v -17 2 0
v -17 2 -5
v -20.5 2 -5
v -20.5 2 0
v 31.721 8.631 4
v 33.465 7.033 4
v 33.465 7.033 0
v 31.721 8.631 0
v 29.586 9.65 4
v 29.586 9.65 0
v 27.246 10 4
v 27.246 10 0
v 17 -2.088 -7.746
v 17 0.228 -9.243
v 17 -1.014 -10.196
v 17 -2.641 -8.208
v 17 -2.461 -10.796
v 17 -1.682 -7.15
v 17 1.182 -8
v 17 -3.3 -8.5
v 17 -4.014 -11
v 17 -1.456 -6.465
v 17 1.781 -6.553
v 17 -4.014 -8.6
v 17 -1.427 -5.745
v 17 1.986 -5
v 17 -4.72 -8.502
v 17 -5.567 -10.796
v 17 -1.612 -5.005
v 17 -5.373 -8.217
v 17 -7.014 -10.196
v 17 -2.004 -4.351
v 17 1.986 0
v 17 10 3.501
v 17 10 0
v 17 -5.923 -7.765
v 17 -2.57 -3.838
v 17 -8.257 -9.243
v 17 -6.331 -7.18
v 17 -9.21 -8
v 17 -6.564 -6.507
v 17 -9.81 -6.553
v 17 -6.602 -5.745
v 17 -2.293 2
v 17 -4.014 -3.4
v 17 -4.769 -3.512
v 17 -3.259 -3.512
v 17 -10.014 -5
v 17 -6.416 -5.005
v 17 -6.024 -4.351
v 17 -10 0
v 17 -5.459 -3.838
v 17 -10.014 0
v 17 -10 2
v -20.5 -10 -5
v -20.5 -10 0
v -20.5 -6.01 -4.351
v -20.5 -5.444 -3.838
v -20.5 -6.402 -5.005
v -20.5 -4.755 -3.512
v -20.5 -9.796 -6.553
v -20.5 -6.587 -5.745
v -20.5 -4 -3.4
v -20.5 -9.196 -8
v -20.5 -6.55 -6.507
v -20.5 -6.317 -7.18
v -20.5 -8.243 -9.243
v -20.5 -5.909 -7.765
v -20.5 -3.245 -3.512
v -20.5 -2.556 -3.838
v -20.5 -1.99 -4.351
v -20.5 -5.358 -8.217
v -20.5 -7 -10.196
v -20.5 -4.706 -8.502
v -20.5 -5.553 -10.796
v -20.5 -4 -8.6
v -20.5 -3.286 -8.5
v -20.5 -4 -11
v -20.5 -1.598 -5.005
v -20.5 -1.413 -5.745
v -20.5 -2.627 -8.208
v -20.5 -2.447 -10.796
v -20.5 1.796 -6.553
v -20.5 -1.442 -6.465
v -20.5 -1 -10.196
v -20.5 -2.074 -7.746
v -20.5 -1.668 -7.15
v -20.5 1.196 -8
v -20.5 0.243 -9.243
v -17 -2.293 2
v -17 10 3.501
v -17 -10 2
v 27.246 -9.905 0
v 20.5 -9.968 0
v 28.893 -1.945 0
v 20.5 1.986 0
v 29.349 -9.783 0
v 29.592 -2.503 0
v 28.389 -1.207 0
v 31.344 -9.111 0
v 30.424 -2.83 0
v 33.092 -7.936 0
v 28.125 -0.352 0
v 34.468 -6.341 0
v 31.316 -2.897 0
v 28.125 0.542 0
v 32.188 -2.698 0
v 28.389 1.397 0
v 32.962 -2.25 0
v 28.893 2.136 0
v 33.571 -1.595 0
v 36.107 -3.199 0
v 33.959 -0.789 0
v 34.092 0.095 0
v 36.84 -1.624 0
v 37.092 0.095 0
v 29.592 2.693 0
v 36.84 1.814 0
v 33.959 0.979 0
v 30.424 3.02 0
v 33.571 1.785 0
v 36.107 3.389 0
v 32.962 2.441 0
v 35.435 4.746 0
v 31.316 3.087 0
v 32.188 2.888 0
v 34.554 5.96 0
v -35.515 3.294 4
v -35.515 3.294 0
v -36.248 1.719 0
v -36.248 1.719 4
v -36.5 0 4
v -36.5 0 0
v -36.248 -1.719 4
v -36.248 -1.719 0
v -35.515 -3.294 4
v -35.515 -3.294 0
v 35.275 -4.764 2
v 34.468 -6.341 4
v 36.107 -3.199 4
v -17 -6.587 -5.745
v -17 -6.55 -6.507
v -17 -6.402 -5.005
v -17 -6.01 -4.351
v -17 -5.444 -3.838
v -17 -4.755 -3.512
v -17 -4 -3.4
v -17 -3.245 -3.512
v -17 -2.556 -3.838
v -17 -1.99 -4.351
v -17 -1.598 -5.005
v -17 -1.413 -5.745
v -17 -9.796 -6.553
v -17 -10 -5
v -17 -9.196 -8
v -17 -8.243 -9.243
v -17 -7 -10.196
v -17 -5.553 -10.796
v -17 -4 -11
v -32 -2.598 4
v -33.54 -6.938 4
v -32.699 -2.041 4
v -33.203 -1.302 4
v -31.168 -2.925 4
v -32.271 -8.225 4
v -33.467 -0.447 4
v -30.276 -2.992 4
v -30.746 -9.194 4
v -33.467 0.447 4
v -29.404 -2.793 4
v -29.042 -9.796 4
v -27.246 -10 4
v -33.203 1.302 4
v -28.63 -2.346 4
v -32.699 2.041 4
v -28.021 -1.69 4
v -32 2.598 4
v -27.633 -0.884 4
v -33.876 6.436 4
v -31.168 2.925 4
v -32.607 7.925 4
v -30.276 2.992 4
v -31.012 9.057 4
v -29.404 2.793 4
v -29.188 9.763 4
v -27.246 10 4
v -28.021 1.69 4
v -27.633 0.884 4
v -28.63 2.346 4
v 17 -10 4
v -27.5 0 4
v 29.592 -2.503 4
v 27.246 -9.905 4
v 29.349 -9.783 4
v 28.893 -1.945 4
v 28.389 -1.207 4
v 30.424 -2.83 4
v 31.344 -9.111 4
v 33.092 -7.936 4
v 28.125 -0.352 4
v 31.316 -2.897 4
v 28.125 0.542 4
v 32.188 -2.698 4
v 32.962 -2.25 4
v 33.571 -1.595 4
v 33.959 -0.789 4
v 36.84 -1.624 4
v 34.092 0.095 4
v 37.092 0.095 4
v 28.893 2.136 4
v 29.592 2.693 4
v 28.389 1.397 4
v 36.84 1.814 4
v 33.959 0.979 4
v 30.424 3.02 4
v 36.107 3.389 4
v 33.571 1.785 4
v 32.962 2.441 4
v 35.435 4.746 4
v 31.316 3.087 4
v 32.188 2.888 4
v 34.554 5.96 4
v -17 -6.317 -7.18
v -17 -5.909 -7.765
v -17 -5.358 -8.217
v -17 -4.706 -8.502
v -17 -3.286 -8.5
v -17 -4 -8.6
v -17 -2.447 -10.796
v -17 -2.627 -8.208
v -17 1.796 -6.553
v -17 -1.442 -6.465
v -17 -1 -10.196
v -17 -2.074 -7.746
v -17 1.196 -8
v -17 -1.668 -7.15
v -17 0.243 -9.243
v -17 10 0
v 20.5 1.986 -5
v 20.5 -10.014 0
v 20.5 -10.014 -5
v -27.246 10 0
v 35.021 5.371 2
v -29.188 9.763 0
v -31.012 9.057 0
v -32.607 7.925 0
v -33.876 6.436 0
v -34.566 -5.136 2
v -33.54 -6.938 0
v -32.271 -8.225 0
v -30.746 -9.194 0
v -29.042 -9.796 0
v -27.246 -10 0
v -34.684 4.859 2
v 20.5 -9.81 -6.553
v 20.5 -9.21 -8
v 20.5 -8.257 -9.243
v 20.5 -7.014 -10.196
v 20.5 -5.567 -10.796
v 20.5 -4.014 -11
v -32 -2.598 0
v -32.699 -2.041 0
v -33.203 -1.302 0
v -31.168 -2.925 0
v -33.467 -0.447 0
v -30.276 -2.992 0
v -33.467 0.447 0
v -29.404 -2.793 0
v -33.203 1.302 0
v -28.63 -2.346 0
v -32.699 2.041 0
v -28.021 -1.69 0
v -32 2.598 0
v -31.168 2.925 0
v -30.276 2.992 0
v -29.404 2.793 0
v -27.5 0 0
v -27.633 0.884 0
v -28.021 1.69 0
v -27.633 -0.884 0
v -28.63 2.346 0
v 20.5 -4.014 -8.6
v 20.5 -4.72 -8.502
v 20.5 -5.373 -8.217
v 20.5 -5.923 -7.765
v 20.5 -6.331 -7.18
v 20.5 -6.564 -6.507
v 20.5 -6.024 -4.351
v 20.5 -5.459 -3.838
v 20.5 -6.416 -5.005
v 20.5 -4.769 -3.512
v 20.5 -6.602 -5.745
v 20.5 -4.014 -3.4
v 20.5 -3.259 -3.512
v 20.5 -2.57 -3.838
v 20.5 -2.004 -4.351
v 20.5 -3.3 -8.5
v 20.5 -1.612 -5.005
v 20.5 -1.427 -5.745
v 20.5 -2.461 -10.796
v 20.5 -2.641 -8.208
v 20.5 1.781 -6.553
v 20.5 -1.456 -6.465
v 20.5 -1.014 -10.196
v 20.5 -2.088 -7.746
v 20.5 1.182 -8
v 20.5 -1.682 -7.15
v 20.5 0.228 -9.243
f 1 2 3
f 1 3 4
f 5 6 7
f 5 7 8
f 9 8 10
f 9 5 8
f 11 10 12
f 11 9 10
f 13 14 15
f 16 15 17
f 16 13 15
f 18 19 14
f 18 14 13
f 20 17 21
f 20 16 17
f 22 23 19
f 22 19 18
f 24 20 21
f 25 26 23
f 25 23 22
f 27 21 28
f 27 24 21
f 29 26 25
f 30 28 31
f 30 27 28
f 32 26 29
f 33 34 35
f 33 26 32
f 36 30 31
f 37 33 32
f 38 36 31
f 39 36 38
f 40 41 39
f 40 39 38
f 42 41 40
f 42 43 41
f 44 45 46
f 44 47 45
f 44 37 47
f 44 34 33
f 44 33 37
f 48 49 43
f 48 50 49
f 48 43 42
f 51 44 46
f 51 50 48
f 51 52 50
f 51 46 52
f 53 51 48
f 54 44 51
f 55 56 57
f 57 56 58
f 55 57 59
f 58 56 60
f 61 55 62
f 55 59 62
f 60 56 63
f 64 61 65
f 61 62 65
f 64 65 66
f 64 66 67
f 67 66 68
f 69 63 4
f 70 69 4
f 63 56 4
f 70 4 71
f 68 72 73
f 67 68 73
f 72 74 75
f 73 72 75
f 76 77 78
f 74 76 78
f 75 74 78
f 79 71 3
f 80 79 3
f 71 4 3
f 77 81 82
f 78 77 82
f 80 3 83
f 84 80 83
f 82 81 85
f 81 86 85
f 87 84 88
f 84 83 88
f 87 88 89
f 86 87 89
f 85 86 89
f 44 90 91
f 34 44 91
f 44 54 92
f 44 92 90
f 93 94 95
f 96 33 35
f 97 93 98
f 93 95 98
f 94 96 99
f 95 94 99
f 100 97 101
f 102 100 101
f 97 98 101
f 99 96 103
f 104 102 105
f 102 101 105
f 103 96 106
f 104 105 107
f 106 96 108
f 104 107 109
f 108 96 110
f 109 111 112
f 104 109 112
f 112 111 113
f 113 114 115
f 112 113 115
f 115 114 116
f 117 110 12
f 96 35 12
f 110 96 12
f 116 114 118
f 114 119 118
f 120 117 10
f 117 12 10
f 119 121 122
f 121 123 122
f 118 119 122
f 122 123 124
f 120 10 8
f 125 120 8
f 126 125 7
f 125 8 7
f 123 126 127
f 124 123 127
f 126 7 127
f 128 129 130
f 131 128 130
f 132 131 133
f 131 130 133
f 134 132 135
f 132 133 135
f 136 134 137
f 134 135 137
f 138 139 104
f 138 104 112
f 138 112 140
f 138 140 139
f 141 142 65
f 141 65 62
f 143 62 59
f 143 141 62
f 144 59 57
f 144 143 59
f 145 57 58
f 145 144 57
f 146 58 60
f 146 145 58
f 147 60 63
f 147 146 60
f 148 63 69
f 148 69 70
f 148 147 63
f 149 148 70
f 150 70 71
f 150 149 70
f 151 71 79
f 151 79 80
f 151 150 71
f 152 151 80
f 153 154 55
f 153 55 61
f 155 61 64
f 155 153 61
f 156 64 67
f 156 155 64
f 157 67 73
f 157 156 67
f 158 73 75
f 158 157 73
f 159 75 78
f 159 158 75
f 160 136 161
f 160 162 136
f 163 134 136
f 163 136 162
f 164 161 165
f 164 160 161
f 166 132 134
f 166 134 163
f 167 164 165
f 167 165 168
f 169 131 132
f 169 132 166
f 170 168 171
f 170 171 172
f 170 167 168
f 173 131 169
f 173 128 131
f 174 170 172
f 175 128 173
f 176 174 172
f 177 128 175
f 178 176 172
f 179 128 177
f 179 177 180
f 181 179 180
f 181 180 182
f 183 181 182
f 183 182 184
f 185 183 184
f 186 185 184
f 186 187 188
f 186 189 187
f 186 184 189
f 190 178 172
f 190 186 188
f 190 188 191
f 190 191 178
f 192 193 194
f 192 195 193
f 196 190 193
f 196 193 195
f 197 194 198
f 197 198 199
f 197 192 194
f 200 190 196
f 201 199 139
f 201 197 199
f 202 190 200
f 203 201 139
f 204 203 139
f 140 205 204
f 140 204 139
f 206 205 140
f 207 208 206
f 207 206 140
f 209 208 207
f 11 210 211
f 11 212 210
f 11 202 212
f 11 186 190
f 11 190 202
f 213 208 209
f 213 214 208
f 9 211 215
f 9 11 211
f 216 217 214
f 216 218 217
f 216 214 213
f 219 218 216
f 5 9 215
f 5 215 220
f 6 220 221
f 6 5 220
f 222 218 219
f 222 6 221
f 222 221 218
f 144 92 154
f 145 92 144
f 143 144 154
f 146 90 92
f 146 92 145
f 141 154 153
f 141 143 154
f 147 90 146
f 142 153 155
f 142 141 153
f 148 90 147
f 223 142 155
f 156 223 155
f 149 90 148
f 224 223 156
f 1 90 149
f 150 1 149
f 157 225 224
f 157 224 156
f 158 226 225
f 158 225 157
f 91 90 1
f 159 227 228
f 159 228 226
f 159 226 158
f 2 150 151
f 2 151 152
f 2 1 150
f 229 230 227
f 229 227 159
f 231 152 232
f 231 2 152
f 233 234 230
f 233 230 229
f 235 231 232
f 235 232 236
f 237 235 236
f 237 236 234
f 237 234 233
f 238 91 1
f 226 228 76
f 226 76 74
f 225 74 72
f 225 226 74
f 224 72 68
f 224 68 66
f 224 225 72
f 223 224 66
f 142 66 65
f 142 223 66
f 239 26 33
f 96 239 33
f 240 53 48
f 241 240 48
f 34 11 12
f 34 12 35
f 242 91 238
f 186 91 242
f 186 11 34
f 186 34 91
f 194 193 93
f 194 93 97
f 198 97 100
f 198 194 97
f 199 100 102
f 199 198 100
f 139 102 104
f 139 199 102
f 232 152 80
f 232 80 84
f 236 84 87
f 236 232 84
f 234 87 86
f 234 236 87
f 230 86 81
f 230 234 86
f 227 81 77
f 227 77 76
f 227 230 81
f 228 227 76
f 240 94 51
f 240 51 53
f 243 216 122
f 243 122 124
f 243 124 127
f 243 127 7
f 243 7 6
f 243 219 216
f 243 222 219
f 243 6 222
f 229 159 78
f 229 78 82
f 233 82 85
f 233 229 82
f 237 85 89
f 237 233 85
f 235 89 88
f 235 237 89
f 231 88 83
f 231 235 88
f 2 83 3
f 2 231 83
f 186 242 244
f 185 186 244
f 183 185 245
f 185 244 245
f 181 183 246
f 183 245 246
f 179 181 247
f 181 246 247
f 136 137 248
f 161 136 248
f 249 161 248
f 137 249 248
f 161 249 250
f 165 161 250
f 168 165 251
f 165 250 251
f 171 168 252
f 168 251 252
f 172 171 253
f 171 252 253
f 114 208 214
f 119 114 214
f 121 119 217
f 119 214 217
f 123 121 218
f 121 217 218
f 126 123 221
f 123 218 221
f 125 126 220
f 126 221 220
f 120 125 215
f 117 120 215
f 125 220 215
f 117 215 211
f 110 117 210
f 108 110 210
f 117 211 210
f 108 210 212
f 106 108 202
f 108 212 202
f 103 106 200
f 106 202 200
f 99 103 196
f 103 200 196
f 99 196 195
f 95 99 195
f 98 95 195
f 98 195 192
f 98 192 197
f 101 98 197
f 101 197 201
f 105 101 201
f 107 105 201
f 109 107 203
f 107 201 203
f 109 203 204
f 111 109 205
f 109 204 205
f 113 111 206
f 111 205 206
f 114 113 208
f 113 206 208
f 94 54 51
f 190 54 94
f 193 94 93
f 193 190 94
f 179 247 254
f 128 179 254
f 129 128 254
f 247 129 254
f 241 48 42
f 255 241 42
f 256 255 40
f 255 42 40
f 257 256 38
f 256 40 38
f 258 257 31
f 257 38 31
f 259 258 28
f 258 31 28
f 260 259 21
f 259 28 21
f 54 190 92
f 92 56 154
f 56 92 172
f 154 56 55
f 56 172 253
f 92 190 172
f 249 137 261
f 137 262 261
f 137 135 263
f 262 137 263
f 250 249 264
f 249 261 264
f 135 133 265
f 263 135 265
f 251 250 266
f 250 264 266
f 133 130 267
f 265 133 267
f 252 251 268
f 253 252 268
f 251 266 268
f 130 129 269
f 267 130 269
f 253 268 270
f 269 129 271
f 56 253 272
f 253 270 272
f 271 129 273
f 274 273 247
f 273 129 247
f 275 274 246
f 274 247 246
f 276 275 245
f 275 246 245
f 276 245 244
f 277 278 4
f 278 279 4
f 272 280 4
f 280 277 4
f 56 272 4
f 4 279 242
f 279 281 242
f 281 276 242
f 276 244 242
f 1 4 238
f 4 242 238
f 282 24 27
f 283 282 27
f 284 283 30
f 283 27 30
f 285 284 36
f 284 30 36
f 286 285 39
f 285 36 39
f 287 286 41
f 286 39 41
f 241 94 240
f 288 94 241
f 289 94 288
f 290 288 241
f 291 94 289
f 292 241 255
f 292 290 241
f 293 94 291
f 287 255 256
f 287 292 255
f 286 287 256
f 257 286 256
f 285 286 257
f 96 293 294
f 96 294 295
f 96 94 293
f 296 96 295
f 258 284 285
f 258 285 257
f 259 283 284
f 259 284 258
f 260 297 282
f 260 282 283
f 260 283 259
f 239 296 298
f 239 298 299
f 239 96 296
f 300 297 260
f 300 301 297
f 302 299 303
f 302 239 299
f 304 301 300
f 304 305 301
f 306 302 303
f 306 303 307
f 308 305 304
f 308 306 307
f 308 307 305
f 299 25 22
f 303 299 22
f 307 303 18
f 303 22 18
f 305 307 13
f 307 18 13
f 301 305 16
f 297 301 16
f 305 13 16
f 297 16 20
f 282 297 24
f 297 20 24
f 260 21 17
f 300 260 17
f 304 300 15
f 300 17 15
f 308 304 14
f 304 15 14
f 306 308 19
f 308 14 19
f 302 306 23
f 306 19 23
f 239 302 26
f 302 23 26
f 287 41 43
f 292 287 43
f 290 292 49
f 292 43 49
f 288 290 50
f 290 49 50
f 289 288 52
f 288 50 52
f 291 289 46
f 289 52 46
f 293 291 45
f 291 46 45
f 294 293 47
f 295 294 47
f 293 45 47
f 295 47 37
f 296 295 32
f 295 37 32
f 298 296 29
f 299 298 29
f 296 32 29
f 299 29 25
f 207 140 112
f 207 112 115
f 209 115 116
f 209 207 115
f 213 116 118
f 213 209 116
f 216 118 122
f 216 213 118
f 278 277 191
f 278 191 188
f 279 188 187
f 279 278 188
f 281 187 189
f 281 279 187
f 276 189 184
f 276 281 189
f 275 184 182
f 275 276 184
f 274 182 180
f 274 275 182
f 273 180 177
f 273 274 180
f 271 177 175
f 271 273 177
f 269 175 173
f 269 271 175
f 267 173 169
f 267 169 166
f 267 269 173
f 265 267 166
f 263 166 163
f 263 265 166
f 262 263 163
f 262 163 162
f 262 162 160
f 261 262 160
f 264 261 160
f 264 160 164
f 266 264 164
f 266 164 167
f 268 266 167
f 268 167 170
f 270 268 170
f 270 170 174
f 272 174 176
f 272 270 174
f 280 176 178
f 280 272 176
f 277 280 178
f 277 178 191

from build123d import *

# Parameters (mm, degrees)
SKETCH1_R           = 3.000027903
BOSS_EXTRUDE1_DEPTH = 4
BOSS_EXTRUDE4_DEPTH = 3.5
BOSS_EXTRUDE6_DEPTH = 34
BOSS_EXTRUDE7_DEPTH = 3.5
SKETCH8_R           = 3.000027903
BOSS_EXTRUDE8_DEPTH = 4


with BuildPart() as part:
    # Sketch1 → Boss-Extrude1 (new body)
    with BuildSketch(Plane.XY):
        with BuildLine():
            ThreePointArc((-35.515, 3.29389), (-36.500003461, -2e-06), (-35.515, -3.293894))
            add(Edge.make_bspline(
                [(-35.515, -3.293894), (-34.604438991, -5.156956918), (-33.54048, -6.937562)],
                knots=[0, 0, 0, 1, 1, 1], degree=2))
            ThreePointArc((-33.54048, -6.937562), (-30.745960827, -9.193764608), (-27.245993386, -10.000000017))
            Line((-27.245993386, -10.000000017), (-16.999993386, -10.000000017))
            Line((-16.999993386, -10.000000017), (-16.999993386, 9.999999983))
            Line((-16.999993386, 9.999999983), (-27.245993386, 9.999999983))
            ThreePointArc((-27.245993386, 9.999999983), (-31.011968955, 9.057189861), (-33.875915, 6.4362595))
            add(Edge.make_bspline(
                [(-33.875915, 6.4362595), (-34.671605619, 4.852572547), (-35.515, 3.29389)],
                knots=[0, 0, 0, 1, 1, 1], degree=2))
        make_face()
        with Locations((-30.500046711, -2e-06)):
            Circle(SKETCH1_R, mode=Mode.SUBTRACT)
    extrude(amount=BOSS_EXTRUDE1_DEPTH)

    # Sketch5 → Boss-Extrude4 (add)
    with BuildSketch(Plane(origin=(-16.999993386, 0, 0), x_dir=(0, 0, -1), z_dir=(1, 0, 0))):
        with BuildLine():
            Line((4.999999299, 2.000001386), (0, 2.000001386))
            Line((0, 2.000001386), (0, -10.000000017))
            Line((0, -10.000000017), (4.999999299, -10.000000017))
            ThreePointArc((4.999999299, -10.000000017), (9.242640482, -8.242640499), (11, -3.999999316))
            ThreePointArc((11, -3.999999316), (9.242640482, 0.242641867), (4.999999299, 2.000001386))
        make_face()
        with BuildLine():
            ThreePointArc((5.745163587, -1.412519358), (7.746056235, -2.073529521), (8.6, -3.999999316))
            ThreePointArc((8.6, -3.999999316), (8.009825654, -5.649423344), (6.507230229, -6.550041118))
            ThreePointArc((6.507230229, -6.550041118), (3.428142195, -4.381492167), (5.745163587, -1.412519358))
        make_face(mode=Mode.SUBTRACT)
    extrude(amount=-BOSS_EXTRUDE4_DEPTH)

    # Sketch5<4> → Boss-Extrude6 (add)
    with BuildSketch(Plane(origin=(-16.999993386, 0, 0), x_dir=(0, 0, -1), z_dir=(1, 0, 0))):
        Polygon((-2, -2.292812017), (-3.500601, 9.999999983), (-4, 9.999999983), (-4, -10.000000017), (-2, -10.000000017), align=None)
    extrude(amount=BOSS_EXTRUDE6_DEPTH)



with BuildPart() as body_2:
    # Sketch7 → Boss-Extrude7 (new body)
    with BuildSketch(Plane(origin=(17.000006614, 0, 0), x_dir=(0, 0, -1), z_dir=(1, 0, 0))):
        with BuildLine():
            Line((4.999999299, 1.98580143), (0, 1.98580143))
            Line((0, 1.98580143), (0, -10.014199973))
            Line((0, -10.014199973), (4.999999299, -10.014199973))
            ThreePointArc((4.999999299, -10.014199973), (9.242640482, -8.256840455), (11, -4.014199272))
            ThreePointArc((11, -4.014199272), (9.242640482, 0.228441911), (4.999999299, 1.98580143))
        make_face()
        with BuildLine():
            ThreePointArc((5.745163587, -1.426719314), (7.746056235, -2.087729477), (8.6, -4.014199272))
            ThreePointArc((8.6, -4.014199272), (8.009825654, -5.6636233), (6.507230229, -6.564241074))
            ThreePointArc((6.507230229, -6.564241074), (3.428142195, -4.395692123), (5.745163587, -1.426719314))
        make_face(mode=Mode.SUBTRACT)
    extrude(amount=BOSS_EXTRUDE7_DEPTH)


with BuildPart() as part_1:
    add(part.part)

    add(body_2.part)  # Boss-Extrude8 merges body 2
    # Sketch8 → Boss-Extrude8 (add)
    with BuildSketch(Plane.XY.offset(4)):
        with BuildLine():
            Line((17.000006614, -10.000000017), (27.246006614, -9.904922539))
            ThreePointArc((27.246006614, -9.904922539), (31.344343382, -9.110808917), (34.467826641, -6.341182039))
            add(Edge.make_bspline(
                [(34.467826641, -6.341182039), (35.26351726, -4.757495086), (36.106911641, -3.198812539)],
                knots=[0, 0, 0, 1, 1, 1], degree=2))
            ThreePointArc((36.106911641, -3.198812539), (37.091915102, 0.095079461), (36.106911641, 3.388971461))
            add(Edge.make_bspline(
                [(36.106911641, 3.388971461), (35.255873472, 5.530984122), (33.464737791, 7.032639461)],
                knots=[0, 0, 0, 1, 1, 1], degree=2))
            ThreePointArc((33.464737791, 7.032639461), (30.691215095, 9.22014949), (27.246006614, 9.999999983))
            Line((27.246006614, 9.999999983), (17.000006614, 9.999999983))
            Line((17.000006614, 9.999999983), (17.000006614, -8.622062624))
            Line((17.000006614, -8.622062624), (17.000006614, -10.000000017))
        make_face()
        with Locations((31.091958352, 0.095079461)):
            Circle(SKETCH8_R, mode=Mode.SUBTRACT)
    extrude(amount=-BOSS_EXTRUDE8_DEPTH)


solid = part_1.part
